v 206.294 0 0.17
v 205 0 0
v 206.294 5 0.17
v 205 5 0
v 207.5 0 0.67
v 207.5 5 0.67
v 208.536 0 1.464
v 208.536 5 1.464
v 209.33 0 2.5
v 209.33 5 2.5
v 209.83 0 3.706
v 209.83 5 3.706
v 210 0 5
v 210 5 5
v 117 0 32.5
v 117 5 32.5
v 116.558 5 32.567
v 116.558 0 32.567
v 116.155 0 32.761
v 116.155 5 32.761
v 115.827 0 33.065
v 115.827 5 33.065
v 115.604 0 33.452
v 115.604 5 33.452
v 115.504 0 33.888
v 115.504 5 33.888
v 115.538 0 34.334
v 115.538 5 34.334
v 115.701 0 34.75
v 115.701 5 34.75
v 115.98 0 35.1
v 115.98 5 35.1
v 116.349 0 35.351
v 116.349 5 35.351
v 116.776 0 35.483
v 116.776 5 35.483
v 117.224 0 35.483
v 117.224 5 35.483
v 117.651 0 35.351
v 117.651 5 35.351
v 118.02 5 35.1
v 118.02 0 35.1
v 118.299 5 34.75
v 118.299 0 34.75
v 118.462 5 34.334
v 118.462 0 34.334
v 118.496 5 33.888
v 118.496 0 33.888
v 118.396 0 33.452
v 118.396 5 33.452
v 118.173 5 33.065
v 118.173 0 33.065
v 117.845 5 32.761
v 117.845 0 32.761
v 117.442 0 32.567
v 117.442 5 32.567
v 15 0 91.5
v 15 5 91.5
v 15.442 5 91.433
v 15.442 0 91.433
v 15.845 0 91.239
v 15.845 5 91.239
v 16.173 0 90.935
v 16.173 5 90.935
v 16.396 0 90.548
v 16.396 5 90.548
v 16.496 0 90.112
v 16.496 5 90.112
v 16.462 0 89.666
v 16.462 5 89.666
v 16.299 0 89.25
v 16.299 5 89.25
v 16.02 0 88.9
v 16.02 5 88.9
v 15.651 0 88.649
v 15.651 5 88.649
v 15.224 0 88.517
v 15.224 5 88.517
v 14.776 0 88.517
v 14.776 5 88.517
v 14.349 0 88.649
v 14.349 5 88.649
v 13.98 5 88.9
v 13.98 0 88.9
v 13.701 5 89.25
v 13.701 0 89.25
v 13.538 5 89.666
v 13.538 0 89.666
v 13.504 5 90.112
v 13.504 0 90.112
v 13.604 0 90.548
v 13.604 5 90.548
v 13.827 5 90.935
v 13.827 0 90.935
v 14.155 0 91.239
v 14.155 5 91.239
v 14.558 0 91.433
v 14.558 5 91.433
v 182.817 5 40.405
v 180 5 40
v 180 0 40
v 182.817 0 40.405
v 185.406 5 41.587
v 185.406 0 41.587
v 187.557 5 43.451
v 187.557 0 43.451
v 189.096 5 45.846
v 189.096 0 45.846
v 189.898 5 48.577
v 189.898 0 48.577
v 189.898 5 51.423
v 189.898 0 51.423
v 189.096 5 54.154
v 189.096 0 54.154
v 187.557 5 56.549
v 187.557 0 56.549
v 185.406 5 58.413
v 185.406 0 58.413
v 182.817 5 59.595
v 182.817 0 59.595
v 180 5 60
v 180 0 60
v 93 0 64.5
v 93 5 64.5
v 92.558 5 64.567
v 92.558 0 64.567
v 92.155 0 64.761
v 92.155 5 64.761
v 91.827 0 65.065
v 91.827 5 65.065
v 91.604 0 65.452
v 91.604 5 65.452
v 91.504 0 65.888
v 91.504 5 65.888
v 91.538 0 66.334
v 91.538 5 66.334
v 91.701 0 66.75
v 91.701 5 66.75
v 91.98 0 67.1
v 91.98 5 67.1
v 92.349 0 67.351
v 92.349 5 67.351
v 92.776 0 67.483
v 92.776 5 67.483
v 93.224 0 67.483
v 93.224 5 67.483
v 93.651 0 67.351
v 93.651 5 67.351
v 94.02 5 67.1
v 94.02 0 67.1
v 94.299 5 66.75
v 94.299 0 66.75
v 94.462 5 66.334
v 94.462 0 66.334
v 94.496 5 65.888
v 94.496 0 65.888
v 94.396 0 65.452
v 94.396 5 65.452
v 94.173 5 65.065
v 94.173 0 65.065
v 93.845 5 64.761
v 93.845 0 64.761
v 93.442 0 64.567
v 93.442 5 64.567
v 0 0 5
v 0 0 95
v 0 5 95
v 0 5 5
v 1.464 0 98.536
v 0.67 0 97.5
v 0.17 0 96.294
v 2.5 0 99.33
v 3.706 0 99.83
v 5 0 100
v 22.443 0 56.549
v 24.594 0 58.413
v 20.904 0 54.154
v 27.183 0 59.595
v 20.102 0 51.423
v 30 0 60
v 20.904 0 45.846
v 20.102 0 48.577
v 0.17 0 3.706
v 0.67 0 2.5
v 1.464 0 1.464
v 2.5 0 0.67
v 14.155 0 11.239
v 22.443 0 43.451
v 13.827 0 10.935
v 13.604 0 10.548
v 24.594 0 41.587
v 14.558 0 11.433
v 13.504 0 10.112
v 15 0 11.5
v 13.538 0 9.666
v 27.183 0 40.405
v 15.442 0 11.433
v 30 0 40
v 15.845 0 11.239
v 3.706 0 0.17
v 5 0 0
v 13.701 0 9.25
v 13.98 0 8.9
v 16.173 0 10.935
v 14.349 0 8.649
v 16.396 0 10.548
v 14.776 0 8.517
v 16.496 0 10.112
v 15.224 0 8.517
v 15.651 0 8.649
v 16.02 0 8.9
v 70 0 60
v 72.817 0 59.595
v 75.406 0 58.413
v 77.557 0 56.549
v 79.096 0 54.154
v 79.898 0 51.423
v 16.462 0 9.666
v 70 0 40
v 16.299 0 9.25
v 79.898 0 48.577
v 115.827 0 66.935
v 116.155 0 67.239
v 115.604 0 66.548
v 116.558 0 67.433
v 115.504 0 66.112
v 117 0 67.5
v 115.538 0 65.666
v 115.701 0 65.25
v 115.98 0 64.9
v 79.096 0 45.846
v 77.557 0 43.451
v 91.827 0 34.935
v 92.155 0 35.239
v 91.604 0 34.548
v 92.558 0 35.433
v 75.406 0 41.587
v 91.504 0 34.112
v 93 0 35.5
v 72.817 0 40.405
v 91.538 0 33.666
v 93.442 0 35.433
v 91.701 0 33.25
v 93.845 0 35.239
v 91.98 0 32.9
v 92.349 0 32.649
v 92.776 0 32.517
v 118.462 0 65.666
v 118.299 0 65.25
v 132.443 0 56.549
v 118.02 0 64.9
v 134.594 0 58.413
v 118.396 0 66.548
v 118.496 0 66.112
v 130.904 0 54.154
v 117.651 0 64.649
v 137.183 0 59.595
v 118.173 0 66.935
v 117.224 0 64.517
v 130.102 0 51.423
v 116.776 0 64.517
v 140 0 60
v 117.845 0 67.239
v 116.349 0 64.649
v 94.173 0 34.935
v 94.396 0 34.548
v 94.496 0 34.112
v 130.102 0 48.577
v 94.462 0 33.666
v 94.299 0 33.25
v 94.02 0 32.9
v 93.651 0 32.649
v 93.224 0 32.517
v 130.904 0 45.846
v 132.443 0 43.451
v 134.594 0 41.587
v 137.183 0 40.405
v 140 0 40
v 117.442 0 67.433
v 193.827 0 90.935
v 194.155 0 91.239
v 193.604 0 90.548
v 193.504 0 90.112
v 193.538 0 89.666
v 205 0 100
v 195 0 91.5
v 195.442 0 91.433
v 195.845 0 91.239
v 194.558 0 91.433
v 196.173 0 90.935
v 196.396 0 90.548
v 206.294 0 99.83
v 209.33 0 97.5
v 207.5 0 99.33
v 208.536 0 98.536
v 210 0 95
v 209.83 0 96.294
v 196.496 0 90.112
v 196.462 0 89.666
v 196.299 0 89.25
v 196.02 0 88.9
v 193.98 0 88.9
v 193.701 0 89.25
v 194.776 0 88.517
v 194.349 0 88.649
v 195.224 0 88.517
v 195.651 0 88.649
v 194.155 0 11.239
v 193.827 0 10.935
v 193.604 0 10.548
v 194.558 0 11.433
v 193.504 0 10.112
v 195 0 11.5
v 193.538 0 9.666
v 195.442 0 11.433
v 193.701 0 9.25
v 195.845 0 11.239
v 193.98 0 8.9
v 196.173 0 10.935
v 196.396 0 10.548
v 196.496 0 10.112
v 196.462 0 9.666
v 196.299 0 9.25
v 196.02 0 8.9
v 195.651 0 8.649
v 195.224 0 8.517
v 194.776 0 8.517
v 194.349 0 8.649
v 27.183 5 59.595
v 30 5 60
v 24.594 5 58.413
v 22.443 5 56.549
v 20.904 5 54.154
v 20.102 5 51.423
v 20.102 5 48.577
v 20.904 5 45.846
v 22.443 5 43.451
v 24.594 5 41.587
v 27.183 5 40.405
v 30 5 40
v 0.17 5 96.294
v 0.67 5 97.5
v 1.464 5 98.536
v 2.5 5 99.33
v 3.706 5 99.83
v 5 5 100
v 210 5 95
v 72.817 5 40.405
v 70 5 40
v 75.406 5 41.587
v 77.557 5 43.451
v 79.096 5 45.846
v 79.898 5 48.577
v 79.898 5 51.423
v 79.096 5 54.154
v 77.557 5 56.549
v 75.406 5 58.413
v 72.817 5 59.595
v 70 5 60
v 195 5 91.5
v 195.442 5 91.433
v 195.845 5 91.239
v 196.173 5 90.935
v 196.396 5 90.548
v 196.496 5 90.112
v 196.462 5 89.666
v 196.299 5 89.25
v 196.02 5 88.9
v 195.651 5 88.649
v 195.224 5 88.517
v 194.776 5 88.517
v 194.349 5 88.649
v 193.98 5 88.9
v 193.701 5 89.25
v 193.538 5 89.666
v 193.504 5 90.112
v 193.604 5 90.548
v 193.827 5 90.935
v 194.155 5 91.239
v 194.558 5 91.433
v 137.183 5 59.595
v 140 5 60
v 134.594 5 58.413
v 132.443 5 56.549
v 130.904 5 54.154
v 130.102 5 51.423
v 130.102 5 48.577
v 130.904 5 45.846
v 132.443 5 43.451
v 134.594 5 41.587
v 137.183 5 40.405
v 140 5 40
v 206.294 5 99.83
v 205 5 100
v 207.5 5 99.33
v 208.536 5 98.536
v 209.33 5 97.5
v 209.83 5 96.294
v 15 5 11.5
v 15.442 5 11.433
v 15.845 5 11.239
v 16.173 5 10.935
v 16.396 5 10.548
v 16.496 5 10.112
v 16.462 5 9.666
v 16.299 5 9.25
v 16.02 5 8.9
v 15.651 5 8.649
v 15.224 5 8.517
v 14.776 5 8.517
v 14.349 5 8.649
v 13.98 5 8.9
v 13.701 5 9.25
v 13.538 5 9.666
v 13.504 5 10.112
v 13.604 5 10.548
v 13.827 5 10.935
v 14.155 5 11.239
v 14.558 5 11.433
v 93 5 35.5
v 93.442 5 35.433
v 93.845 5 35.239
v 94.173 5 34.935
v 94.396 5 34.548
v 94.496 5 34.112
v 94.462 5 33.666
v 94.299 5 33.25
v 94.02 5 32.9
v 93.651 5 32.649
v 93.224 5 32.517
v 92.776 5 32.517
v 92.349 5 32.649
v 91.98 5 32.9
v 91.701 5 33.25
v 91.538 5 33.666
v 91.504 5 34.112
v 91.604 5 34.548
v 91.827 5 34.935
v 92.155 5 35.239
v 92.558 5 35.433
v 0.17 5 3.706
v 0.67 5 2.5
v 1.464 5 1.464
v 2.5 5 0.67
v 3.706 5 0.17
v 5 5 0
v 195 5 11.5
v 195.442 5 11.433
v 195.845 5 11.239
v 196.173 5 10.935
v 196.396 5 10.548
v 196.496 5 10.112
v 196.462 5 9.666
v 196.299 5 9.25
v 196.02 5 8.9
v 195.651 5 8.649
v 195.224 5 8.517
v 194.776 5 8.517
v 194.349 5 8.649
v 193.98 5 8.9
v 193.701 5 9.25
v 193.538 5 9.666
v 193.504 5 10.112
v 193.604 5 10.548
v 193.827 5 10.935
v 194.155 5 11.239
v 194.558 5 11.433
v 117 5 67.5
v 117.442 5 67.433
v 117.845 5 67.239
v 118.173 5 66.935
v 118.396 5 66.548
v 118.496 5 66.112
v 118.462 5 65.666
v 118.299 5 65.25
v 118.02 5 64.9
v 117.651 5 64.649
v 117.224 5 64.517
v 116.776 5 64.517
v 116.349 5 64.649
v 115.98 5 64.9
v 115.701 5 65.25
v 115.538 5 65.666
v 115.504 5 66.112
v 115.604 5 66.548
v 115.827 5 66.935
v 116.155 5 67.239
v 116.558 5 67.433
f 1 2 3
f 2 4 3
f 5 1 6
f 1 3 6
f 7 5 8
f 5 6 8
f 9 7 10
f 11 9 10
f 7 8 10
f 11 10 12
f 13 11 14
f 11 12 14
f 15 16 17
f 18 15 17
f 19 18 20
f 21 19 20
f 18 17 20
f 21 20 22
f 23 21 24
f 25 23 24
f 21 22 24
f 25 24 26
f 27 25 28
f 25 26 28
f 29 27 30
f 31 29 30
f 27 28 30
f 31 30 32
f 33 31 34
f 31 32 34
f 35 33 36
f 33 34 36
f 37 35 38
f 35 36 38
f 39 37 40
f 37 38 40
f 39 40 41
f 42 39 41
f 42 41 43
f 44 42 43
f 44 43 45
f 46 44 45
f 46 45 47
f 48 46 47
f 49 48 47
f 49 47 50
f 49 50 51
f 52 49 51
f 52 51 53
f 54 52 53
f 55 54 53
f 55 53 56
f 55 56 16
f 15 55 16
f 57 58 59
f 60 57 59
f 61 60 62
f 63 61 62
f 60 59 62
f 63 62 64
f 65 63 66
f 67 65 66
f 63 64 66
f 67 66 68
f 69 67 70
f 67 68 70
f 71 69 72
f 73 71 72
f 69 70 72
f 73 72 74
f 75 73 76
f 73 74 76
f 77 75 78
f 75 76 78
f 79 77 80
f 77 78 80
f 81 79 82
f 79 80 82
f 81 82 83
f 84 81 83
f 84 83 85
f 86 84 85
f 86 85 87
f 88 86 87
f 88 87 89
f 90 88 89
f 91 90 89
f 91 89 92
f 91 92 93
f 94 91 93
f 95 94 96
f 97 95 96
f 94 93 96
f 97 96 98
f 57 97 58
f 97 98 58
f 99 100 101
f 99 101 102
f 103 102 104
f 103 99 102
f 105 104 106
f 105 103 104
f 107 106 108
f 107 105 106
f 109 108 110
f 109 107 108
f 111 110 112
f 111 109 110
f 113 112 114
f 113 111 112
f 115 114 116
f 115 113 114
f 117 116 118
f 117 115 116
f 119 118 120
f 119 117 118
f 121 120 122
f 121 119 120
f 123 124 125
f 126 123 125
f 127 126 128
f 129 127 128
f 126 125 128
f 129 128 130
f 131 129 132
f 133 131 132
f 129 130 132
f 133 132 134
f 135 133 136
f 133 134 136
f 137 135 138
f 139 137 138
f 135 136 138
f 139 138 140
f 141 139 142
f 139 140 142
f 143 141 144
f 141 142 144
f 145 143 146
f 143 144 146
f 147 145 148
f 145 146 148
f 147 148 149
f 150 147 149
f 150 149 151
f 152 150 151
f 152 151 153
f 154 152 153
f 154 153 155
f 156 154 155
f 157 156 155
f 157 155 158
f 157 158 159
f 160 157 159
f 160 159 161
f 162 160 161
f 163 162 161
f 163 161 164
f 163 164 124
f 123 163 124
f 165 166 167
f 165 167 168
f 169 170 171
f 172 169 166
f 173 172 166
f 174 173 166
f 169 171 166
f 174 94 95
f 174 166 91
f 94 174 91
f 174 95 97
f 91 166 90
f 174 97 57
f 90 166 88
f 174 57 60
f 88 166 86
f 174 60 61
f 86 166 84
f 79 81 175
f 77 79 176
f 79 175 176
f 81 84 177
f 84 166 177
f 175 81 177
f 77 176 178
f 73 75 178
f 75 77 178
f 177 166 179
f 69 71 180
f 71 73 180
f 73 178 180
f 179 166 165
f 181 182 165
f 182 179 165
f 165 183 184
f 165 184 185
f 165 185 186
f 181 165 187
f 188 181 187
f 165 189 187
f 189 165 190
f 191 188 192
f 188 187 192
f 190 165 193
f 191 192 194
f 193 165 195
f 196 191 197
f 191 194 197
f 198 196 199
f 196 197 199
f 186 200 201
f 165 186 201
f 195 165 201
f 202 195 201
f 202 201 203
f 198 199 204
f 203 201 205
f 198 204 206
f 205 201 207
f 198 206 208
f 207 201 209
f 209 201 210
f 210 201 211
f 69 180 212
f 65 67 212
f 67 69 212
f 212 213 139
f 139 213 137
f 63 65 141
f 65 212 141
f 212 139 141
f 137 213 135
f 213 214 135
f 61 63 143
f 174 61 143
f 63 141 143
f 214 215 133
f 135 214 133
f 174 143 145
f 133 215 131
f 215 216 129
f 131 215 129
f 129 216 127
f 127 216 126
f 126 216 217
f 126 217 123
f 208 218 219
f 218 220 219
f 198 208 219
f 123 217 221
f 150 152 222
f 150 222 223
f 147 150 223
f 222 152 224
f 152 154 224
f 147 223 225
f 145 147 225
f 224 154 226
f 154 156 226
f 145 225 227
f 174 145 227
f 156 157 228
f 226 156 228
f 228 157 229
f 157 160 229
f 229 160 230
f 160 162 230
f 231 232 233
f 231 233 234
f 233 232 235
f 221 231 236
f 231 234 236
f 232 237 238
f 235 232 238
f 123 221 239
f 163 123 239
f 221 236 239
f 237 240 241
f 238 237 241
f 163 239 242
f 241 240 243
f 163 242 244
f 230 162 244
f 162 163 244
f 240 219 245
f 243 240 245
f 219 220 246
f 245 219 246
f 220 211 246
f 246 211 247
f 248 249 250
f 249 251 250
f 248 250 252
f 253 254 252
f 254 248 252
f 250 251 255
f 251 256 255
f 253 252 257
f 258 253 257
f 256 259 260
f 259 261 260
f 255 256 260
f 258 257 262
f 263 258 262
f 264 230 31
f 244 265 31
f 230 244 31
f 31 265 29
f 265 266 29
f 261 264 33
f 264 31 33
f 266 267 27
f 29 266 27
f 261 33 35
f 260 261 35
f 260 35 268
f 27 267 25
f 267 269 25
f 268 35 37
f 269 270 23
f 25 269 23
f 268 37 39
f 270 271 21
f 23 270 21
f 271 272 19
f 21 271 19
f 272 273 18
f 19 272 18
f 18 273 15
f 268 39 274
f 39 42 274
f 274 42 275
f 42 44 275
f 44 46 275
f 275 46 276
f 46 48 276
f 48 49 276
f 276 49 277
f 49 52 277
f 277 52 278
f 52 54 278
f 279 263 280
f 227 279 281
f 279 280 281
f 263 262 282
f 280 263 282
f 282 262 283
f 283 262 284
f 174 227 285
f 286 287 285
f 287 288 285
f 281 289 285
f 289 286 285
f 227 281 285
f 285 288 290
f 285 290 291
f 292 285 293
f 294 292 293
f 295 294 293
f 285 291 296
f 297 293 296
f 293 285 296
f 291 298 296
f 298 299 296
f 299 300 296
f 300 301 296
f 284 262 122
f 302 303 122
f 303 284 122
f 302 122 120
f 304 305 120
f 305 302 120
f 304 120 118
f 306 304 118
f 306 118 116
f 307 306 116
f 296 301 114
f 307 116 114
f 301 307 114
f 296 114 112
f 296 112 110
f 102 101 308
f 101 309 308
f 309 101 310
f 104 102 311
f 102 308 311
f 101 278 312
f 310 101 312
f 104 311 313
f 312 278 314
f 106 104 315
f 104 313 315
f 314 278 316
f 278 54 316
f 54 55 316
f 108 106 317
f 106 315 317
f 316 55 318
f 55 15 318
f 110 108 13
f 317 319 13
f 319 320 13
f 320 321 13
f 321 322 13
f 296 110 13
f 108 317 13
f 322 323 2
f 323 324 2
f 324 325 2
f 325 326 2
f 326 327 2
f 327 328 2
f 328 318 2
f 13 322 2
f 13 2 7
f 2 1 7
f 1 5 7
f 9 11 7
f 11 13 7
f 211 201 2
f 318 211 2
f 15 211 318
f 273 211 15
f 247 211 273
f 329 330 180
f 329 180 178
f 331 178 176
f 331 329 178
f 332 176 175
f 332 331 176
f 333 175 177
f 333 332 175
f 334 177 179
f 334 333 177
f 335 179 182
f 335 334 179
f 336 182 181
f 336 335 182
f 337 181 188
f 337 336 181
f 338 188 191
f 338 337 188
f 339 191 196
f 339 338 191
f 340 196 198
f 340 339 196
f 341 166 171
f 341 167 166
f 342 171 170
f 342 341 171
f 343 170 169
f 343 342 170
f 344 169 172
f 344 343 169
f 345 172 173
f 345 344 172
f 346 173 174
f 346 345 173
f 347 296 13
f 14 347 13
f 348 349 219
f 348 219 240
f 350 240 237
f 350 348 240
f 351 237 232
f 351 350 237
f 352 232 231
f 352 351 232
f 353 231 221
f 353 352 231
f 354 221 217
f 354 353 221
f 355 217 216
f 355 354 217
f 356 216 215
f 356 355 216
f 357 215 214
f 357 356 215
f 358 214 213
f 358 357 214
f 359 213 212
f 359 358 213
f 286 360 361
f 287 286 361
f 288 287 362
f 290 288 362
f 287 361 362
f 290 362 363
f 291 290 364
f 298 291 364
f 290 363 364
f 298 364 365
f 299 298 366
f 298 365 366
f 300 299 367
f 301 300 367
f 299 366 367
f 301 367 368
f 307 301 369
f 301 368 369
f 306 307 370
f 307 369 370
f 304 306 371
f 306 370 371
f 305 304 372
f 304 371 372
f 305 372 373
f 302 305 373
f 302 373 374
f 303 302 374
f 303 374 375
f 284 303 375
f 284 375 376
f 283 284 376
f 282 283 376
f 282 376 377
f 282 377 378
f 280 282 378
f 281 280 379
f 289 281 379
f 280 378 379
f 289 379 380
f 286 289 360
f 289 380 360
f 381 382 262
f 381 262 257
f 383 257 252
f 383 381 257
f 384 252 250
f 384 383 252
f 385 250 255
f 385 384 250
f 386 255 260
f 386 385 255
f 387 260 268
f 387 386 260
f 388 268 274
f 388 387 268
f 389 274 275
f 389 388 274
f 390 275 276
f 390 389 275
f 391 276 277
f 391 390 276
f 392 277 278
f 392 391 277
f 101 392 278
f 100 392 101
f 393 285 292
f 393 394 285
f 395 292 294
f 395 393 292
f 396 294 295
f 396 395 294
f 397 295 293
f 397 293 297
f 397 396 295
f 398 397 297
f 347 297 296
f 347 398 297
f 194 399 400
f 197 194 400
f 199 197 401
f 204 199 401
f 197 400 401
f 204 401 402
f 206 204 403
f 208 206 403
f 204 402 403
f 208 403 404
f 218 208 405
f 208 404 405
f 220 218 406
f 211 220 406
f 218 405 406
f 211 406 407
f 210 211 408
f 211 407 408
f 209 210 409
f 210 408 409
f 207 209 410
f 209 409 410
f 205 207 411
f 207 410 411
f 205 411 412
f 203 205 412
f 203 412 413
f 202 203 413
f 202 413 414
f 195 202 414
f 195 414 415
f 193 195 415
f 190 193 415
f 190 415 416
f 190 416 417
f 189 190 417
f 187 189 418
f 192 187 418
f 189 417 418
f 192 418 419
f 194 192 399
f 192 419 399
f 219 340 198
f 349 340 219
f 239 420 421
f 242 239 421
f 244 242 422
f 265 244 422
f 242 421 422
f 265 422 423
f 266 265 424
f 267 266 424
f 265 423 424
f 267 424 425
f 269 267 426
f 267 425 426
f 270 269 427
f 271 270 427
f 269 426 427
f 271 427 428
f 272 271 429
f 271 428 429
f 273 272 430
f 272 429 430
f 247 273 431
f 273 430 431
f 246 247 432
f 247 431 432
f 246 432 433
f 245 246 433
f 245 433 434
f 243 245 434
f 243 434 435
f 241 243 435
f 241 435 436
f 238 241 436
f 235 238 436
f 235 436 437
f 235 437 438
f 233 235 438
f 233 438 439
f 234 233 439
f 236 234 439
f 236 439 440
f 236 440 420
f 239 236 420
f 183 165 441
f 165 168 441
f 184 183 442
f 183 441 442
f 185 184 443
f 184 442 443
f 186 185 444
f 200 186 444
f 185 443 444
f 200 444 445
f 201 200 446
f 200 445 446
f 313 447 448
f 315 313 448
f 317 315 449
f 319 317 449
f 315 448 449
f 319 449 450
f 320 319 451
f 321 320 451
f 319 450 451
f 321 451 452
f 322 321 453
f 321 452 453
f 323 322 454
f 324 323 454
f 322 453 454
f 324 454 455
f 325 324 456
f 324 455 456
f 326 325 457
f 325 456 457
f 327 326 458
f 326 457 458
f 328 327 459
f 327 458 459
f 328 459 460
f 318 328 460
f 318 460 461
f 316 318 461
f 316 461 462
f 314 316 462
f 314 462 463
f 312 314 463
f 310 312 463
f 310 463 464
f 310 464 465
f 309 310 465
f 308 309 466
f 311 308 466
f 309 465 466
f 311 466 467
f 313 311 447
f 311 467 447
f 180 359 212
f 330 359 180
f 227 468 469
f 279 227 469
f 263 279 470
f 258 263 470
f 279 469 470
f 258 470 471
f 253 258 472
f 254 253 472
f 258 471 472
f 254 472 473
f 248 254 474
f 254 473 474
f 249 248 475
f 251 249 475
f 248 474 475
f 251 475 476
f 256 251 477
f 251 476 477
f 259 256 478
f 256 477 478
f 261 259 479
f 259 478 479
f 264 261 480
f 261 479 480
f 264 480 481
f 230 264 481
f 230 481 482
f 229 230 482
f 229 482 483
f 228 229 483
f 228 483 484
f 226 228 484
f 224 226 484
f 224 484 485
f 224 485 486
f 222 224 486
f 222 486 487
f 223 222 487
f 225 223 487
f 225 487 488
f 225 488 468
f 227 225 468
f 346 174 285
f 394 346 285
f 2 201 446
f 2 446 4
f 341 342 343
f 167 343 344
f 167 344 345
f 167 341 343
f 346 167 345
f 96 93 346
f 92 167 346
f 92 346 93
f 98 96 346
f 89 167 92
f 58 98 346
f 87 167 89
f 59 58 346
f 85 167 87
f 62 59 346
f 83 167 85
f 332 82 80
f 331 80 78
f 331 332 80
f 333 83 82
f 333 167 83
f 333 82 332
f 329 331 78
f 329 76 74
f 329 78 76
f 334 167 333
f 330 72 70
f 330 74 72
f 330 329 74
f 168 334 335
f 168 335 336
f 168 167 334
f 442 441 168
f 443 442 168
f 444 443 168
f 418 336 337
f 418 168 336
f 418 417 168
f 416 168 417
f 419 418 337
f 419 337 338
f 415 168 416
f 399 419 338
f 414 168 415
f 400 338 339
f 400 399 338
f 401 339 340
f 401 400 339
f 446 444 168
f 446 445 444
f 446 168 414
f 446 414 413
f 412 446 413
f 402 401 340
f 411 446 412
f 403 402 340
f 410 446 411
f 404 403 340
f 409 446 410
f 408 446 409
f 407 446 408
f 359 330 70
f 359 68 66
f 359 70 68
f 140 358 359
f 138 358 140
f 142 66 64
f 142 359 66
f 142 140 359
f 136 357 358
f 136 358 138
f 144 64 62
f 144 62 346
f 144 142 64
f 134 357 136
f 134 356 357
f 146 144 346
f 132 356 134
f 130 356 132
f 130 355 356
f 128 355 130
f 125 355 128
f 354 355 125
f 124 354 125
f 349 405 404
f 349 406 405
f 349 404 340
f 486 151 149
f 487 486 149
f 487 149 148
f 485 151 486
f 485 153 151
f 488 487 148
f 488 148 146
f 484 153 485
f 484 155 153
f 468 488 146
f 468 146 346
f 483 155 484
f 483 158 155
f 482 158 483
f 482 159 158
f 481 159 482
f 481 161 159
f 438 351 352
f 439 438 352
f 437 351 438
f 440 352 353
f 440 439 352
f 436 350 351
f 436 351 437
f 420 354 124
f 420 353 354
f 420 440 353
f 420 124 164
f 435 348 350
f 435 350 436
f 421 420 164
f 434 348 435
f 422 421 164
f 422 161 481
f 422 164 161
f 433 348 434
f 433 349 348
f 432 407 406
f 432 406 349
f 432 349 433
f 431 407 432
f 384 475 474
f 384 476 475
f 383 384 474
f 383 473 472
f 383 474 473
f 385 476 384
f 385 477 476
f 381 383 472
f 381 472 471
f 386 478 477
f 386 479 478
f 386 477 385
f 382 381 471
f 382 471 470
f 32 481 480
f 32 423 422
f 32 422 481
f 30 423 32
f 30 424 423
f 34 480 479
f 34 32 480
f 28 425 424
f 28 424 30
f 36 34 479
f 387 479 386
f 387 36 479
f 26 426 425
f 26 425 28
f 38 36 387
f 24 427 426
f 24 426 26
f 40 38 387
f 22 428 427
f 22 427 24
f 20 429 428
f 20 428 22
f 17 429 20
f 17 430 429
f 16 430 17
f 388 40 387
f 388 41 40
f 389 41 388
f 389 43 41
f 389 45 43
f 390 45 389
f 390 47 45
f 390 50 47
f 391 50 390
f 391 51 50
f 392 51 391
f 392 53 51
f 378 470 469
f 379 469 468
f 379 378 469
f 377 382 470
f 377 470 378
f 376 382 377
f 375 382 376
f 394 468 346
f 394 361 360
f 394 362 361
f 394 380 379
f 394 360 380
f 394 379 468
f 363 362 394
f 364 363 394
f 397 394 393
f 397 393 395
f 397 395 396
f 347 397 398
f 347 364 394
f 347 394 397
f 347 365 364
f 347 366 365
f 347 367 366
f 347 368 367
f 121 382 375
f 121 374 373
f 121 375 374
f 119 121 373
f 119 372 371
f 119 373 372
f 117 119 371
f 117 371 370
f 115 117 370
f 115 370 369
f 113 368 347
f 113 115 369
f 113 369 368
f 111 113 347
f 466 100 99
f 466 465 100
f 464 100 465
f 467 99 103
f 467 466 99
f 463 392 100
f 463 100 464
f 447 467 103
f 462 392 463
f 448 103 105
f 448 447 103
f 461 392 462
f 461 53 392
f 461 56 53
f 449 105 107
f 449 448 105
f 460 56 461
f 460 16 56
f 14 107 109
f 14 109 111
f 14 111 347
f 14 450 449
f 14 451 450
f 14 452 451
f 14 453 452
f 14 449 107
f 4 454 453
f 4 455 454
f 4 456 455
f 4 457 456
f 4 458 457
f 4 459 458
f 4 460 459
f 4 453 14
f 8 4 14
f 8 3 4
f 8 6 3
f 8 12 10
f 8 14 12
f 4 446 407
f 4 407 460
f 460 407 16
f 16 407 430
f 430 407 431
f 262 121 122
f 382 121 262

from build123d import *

# Parameters (mm, degrees)
SKETCH_1_W          = 210
SKETCH_1_H          = 100
EXTRUDE_1_DEPTH     = 5
CUT_EXTRUDE_1_DEPTH = 40
SKETCH_8_R          = 1.5
CUT_EXTRUDE_7_DEPTH = 5
FILLET_1_R          = 5
SKETCH_9_R          = 1.5
CUT_EXTRUDE_8_DEPTH = 233.647802483


with BuildPart() as part:
    # 草图1 → 凸台-拉伸1 (new body)
    with BuildSketch(Plane(origin=(0, 0, 0), x_dir=(1, 0, 0), z_dir=(0, 1, 0))):
        with Locations((105, -50)):
            Rectangle(SKETCH_1_W, SKETCH_1_H)
    extrude(amount=EXTRUDE_1_DEPTH)

    # 草图2 → 切除-拉伸1 (cut)
    with BuildSketch(Plane(origin=(0, 5, 0), x_dir=(1, 0, 0), z_dir=(0, 1, 0))):
        with BuildLine():
            Line((30, -40), (70, -40))
            ThreePointArc((70, -40), (80, -50), (70, -60))
            Line((70, -60), (30, -60))
            ThreePointArc((30, -60), (20, -50), (30, -40))
        make_face()
        with BuildLine():
            Line((140, -40), (180, -40))
            ThreePointArc((180, -40), (190, -50), (180, -60))
            Line((180, -60), (140, -60))
            ThreePointArc((140, -60), (130, -50), (140, -40))
        make_face()
    extrude(amount=-CUT_EXTRUDE_1_DEPTH, mode=Mode.SUBTRACT)

    # 草图8 → 切除-拉伸7 (cut)
    with BuildSketch(Plane(origin=(0, 5, 0), x_dir=(1, 0, 0), z_dir=(0, 1, 0))):
        with Locations(Location((15, -10, 0), (0, 0, 270))):
            Circle(SKETCH_8_R)
        with Locations(Location((15, -90, 0), (0, 0, 270))):
            Circle(SKETCH_8_R)
        with Locations(Location((195, -90, 0), (0, 0, 270))):
            Circle(SKETCH_8_R)
        with Locations(Location((195, -10, 0), (0, 0, 270))):
            Circle(SKETCH_8_R)
    extrude(amount=-CUT_EXTRUDE_7_DEPTH, mode=Mode.SUBTRACT)

    # 圆角1
    fillet_1_edges = [part.edges().sort_by_distance(p)[0] for p in [
        (0, 2.5, 0),
        (210, 2.5, 0),
        (210, 2.5, 100),
        (0, 2.5, 100),
    ]]
    fillet(fillet_1_edges, radius=FILLET_1_R)

    # 草图9 → 切除-拉伸8 (cut, through all)
    with BuildSketch(Plane(origin=(0, 5, 0), x_dir=(1, 0, 0), z_dir=(0, 1, 0))):
        with Locations(Location((93, -34, 0), (0, 0, 270))):
            Circle(SKETCH_9_R)
        with Locations(Location((117, -34, 0), (0, 0, 90))):
            Circle(SKETCH_9_R)
        with Locations(Location((117, -66, 0), (0, 0, 270))):
            Circle(SKETCH_9_R)
        with Locations(Location((93, -66, 0), (0, 0, 90))):
            Circle(SKETCH_9_R)
    extrude(amount=-CUT_EXTRUDE_8_DEPTH, mode=Mode.SUBTRACT)


solid = part.part
